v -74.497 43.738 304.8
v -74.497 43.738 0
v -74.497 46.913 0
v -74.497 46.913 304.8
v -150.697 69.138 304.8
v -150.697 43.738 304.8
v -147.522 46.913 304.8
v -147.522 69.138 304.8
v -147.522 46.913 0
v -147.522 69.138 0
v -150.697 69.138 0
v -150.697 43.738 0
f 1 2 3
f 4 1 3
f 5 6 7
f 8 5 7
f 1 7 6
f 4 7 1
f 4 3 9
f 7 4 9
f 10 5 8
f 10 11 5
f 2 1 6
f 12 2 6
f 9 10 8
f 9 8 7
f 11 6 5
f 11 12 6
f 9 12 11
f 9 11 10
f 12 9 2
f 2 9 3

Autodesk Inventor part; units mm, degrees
ref_plane "YZ Plane" through (0, 0, 0) normal (1, 0, 0) x (0, 1, 0)
ref_plane "XZ Plane" through (0, 0, 0) normal (0, 1, 0) x (-1, 0, 0)
ref_plane "XY Plane" through (0, 0, 0) normal (0, 0, 1) x (1, 0, 0)
sketch "Sketch1" plane through (0, 0, 0) normal (0, 0, 1) x (1, 0, 0)
  line L0 (-150.6966, 69.1379) -> (-147.5216, 69.1379)
  line L1 (-147.5216, 69.1379) -> (-147.5216, 43.7379)
  line L2 (-147.5216, 43.7379) -> (-150.6966, 43.7379)
  line L3 (-150.6966, 43.7379) -> (-150.6966, 69.1379)
  line L4 (-150.6966, 43.7379) -> (-74.4966, 43.7379)
  line L5 (-74.4966, 43.7379) -> (-74.4966, 46.9129)
  line L6 (-74.4966, 46.9129) -> (-150.6966, 46.9129)
  line L7 (-150.6966, 46.9129) -> (-150.6966, 43.7379)
  point P0 (0, 0)
  point P1 (-147.5216, 46.9129)
  dimension "d0" = 3.175
  dimension "d1" = 25.4
  dimension "d2" = 76.2
  dimension "d3" = 3.175
extrude "Extrusion1" add sketch "Sketch1" along normal blind 304.8
properties part number "shootingGuide"
